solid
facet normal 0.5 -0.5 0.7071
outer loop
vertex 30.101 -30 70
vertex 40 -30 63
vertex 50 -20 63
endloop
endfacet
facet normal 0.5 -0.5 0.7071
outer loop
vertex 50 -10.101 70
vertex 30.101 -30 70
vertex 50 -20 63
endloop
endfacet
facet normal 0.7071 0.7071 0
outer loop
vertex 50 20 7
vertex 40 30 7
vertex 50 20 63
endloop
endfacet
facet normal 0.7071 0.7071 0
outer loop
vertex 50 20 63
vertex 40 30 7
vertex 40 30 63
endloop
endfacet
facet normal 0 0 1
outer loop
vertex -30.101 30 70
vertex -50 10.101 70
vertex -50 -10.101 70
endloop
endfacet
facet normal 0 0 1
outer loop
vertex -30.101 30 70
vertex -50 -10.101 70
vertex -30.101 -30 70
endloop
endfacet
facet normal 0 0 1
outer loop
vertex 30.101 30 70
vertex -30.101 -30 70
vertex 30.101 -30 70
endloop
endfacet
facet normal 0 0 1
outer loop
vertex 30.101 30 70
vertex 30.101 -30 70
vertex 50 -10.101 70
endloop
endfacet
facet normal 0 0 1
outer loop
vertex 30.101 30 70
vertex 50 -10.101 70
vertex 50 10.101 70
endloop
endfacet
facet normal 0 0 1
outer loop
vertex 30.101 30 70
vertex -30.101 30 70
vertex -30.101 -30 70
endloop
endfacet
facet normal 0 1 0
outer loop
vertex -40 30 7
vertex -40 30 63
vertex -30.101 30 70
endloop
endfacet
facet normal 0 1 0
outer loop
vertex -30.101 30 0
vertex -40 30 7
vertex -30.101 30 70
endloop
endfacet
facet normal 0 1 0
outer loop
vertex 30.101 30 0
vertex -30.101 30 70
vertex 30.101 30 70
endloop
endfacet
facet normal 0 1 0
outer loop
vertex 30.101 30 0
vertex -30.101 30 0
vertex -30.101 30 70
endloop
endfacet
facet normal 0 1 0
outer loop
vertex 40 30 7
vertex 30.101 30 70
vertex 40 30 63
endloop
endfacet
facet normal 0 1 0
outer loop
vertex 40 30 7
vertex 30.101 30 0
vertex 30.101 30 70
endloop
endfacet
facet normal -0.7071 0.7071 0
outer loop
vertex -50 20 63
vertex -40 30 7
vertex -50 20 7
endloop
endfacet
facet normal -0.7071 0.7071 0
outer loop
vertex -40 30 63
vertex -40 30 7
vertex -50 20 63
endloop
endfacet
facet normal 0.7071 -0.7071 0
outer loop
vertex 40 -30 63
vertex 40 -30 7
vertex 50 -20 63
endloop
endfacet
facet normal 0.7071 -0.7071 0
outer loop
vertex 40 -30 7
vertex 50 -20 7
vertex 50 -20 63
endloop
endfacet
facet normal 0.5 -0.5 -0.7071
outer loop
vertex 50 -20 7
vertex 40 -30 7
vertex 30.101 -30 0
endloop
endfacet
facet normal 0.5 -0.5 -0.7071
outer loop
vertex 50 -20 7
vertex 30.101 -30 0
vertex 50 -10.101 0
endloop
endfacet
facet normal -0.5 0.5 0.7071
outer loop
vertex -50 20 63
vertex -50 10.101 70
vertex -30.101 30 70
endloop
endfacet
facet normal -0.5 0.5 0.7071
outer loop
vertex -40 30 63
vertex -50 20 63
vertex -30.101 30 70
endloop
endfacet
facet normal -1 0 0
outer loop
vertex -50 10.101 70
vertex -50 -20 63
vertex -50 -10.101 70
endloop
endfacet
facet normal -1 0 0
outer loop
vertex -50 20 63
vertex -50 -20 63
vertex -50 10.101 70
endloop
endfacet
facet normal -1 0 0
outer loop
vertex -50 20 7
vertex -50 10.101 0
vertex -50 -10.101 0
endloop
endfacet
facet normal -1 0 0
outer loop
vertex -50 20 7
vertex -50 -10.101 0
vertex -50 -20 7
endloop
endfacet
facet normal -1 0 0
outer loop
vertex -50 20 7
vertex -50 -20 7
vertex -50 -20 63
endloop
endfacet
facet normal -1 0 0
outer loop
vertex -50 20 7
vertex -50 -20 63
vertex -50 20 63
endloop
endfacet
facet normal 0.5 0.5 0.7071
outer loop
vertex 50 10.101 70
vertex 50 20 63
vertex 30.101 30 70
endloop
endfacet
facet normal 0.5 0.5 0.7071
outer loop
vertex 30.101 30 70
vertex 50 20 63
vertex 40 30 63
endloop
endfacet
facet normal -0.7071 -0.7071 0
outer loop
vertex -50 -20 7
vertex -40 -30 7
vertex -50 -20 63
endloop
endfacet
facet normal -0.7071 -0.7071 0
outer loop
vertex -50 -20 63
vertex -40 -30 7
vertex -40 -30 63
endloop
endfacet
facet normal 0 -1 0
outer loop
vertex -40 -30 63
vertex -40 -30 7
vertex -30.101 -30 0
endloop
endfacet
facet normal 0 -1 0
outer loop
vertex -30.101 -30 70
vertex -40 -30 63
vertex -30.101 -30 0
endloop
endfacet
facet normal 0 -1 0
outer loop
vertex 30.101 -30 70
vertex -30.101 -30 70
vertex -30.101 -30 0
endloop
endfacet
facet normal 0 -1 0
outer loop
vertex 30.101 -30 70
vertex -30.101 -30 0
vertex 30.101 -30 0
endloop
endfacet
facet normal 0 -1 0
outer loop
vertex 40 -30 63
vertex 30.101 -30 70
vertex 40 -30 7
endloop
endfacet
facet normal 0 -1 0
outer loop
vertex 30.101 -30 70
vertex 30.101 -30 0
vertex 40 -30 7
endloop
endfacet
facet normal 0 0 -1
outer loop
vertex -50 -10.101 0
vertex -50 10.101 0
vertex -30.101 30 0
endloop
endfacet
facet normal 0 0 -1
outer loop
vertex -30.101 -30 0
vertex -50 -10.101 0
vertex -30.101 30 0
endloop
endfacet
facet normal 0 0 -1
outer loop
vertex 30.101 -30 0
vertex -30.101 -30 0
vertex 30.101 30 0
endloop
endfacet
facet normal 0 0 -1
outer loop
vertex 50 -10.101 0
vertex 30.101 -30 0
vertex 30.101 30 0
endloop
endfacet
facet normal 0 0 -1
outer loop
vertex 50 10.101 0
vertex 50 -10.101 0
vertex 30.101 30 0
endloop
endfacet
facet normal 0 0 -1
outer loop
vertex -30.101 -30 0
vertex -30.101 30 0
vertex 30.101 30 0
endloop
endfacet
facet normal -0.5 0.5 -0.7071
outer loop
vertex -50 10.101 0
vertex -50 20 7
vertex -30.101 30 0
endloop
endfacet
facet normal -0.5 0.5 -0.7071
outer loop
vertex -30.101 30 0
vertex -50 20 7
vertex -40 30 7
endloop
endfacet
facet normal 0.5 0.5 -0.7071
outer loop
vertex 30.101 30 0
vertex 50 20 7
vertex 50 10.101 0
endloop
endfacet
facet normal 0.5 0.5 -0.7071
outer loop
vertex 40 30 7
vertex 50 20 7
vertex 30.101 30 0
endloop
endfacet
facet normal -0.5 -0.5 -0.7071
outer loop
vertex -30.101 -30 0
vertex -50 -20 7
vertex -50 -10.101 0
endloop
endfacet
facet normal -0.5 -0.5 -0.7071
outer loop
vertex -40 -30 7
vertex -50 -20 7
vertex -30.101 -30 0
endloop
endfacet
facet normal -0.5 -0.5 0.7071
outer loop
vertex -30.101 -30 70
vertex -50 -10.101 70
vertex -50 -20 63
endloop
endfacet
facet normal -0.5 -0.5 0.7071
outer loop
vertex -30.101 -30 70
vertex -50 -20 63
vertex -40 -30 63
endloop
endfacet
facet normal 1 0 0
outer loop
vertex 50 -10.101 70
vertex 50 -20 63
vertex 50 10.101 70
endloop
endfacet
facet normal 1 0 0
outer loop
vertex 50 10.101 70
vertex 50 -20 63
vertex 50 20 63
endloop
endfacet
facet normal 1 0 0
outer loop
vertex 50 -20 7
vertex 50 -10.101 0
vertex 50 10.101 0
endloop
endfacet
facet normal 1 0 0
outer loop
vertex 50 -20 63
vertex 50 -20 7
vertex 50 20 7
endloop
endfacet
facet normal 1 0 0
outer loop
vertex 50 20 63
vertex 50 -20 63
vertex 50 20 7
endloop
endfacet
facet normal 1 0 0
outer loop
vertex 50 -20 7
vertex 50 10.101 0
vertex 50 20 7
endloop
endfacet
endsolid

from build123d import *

# Parameters (mm, degrees)
F0_W     = 100
F0_H     = 60
F1_DEPTH = 70
F2_SIZE  = 10
F3_SIZE  = 7


with BuildPart() as f1:
    # F0 (on Top) → F1 (new body)
    with BuildSketch(Plane.XY):
        Rectangle(F0_W, F0_H)
    extrude(amount=F1_DEPTH)

    # F2
    f2_edges = [f1.edges().sort_by_distance(p)[0] for p in [
        (-50, -30, 35),
        (50, -30, 35),
        (50, 30, 35),
        (-50, 30, 35),
    ]]
    chamfer(f2_edges, length=F2_SIZE)

    # F3
    f3_edges = [f1.edges().sort_by_distance(p)[0] for p in [
        (45, 25, 70),
        (45, 25, 0),
        (-45, 25, 70),
        (-45, 25, 0),
        (-45, -25, 70),
        (45, -25, 70),
        (-45, -25, 0),
        (45, -25, 0),
    ]]
    chamfer(f3_edges, length=F3_SIZE)


solid = f1.part
